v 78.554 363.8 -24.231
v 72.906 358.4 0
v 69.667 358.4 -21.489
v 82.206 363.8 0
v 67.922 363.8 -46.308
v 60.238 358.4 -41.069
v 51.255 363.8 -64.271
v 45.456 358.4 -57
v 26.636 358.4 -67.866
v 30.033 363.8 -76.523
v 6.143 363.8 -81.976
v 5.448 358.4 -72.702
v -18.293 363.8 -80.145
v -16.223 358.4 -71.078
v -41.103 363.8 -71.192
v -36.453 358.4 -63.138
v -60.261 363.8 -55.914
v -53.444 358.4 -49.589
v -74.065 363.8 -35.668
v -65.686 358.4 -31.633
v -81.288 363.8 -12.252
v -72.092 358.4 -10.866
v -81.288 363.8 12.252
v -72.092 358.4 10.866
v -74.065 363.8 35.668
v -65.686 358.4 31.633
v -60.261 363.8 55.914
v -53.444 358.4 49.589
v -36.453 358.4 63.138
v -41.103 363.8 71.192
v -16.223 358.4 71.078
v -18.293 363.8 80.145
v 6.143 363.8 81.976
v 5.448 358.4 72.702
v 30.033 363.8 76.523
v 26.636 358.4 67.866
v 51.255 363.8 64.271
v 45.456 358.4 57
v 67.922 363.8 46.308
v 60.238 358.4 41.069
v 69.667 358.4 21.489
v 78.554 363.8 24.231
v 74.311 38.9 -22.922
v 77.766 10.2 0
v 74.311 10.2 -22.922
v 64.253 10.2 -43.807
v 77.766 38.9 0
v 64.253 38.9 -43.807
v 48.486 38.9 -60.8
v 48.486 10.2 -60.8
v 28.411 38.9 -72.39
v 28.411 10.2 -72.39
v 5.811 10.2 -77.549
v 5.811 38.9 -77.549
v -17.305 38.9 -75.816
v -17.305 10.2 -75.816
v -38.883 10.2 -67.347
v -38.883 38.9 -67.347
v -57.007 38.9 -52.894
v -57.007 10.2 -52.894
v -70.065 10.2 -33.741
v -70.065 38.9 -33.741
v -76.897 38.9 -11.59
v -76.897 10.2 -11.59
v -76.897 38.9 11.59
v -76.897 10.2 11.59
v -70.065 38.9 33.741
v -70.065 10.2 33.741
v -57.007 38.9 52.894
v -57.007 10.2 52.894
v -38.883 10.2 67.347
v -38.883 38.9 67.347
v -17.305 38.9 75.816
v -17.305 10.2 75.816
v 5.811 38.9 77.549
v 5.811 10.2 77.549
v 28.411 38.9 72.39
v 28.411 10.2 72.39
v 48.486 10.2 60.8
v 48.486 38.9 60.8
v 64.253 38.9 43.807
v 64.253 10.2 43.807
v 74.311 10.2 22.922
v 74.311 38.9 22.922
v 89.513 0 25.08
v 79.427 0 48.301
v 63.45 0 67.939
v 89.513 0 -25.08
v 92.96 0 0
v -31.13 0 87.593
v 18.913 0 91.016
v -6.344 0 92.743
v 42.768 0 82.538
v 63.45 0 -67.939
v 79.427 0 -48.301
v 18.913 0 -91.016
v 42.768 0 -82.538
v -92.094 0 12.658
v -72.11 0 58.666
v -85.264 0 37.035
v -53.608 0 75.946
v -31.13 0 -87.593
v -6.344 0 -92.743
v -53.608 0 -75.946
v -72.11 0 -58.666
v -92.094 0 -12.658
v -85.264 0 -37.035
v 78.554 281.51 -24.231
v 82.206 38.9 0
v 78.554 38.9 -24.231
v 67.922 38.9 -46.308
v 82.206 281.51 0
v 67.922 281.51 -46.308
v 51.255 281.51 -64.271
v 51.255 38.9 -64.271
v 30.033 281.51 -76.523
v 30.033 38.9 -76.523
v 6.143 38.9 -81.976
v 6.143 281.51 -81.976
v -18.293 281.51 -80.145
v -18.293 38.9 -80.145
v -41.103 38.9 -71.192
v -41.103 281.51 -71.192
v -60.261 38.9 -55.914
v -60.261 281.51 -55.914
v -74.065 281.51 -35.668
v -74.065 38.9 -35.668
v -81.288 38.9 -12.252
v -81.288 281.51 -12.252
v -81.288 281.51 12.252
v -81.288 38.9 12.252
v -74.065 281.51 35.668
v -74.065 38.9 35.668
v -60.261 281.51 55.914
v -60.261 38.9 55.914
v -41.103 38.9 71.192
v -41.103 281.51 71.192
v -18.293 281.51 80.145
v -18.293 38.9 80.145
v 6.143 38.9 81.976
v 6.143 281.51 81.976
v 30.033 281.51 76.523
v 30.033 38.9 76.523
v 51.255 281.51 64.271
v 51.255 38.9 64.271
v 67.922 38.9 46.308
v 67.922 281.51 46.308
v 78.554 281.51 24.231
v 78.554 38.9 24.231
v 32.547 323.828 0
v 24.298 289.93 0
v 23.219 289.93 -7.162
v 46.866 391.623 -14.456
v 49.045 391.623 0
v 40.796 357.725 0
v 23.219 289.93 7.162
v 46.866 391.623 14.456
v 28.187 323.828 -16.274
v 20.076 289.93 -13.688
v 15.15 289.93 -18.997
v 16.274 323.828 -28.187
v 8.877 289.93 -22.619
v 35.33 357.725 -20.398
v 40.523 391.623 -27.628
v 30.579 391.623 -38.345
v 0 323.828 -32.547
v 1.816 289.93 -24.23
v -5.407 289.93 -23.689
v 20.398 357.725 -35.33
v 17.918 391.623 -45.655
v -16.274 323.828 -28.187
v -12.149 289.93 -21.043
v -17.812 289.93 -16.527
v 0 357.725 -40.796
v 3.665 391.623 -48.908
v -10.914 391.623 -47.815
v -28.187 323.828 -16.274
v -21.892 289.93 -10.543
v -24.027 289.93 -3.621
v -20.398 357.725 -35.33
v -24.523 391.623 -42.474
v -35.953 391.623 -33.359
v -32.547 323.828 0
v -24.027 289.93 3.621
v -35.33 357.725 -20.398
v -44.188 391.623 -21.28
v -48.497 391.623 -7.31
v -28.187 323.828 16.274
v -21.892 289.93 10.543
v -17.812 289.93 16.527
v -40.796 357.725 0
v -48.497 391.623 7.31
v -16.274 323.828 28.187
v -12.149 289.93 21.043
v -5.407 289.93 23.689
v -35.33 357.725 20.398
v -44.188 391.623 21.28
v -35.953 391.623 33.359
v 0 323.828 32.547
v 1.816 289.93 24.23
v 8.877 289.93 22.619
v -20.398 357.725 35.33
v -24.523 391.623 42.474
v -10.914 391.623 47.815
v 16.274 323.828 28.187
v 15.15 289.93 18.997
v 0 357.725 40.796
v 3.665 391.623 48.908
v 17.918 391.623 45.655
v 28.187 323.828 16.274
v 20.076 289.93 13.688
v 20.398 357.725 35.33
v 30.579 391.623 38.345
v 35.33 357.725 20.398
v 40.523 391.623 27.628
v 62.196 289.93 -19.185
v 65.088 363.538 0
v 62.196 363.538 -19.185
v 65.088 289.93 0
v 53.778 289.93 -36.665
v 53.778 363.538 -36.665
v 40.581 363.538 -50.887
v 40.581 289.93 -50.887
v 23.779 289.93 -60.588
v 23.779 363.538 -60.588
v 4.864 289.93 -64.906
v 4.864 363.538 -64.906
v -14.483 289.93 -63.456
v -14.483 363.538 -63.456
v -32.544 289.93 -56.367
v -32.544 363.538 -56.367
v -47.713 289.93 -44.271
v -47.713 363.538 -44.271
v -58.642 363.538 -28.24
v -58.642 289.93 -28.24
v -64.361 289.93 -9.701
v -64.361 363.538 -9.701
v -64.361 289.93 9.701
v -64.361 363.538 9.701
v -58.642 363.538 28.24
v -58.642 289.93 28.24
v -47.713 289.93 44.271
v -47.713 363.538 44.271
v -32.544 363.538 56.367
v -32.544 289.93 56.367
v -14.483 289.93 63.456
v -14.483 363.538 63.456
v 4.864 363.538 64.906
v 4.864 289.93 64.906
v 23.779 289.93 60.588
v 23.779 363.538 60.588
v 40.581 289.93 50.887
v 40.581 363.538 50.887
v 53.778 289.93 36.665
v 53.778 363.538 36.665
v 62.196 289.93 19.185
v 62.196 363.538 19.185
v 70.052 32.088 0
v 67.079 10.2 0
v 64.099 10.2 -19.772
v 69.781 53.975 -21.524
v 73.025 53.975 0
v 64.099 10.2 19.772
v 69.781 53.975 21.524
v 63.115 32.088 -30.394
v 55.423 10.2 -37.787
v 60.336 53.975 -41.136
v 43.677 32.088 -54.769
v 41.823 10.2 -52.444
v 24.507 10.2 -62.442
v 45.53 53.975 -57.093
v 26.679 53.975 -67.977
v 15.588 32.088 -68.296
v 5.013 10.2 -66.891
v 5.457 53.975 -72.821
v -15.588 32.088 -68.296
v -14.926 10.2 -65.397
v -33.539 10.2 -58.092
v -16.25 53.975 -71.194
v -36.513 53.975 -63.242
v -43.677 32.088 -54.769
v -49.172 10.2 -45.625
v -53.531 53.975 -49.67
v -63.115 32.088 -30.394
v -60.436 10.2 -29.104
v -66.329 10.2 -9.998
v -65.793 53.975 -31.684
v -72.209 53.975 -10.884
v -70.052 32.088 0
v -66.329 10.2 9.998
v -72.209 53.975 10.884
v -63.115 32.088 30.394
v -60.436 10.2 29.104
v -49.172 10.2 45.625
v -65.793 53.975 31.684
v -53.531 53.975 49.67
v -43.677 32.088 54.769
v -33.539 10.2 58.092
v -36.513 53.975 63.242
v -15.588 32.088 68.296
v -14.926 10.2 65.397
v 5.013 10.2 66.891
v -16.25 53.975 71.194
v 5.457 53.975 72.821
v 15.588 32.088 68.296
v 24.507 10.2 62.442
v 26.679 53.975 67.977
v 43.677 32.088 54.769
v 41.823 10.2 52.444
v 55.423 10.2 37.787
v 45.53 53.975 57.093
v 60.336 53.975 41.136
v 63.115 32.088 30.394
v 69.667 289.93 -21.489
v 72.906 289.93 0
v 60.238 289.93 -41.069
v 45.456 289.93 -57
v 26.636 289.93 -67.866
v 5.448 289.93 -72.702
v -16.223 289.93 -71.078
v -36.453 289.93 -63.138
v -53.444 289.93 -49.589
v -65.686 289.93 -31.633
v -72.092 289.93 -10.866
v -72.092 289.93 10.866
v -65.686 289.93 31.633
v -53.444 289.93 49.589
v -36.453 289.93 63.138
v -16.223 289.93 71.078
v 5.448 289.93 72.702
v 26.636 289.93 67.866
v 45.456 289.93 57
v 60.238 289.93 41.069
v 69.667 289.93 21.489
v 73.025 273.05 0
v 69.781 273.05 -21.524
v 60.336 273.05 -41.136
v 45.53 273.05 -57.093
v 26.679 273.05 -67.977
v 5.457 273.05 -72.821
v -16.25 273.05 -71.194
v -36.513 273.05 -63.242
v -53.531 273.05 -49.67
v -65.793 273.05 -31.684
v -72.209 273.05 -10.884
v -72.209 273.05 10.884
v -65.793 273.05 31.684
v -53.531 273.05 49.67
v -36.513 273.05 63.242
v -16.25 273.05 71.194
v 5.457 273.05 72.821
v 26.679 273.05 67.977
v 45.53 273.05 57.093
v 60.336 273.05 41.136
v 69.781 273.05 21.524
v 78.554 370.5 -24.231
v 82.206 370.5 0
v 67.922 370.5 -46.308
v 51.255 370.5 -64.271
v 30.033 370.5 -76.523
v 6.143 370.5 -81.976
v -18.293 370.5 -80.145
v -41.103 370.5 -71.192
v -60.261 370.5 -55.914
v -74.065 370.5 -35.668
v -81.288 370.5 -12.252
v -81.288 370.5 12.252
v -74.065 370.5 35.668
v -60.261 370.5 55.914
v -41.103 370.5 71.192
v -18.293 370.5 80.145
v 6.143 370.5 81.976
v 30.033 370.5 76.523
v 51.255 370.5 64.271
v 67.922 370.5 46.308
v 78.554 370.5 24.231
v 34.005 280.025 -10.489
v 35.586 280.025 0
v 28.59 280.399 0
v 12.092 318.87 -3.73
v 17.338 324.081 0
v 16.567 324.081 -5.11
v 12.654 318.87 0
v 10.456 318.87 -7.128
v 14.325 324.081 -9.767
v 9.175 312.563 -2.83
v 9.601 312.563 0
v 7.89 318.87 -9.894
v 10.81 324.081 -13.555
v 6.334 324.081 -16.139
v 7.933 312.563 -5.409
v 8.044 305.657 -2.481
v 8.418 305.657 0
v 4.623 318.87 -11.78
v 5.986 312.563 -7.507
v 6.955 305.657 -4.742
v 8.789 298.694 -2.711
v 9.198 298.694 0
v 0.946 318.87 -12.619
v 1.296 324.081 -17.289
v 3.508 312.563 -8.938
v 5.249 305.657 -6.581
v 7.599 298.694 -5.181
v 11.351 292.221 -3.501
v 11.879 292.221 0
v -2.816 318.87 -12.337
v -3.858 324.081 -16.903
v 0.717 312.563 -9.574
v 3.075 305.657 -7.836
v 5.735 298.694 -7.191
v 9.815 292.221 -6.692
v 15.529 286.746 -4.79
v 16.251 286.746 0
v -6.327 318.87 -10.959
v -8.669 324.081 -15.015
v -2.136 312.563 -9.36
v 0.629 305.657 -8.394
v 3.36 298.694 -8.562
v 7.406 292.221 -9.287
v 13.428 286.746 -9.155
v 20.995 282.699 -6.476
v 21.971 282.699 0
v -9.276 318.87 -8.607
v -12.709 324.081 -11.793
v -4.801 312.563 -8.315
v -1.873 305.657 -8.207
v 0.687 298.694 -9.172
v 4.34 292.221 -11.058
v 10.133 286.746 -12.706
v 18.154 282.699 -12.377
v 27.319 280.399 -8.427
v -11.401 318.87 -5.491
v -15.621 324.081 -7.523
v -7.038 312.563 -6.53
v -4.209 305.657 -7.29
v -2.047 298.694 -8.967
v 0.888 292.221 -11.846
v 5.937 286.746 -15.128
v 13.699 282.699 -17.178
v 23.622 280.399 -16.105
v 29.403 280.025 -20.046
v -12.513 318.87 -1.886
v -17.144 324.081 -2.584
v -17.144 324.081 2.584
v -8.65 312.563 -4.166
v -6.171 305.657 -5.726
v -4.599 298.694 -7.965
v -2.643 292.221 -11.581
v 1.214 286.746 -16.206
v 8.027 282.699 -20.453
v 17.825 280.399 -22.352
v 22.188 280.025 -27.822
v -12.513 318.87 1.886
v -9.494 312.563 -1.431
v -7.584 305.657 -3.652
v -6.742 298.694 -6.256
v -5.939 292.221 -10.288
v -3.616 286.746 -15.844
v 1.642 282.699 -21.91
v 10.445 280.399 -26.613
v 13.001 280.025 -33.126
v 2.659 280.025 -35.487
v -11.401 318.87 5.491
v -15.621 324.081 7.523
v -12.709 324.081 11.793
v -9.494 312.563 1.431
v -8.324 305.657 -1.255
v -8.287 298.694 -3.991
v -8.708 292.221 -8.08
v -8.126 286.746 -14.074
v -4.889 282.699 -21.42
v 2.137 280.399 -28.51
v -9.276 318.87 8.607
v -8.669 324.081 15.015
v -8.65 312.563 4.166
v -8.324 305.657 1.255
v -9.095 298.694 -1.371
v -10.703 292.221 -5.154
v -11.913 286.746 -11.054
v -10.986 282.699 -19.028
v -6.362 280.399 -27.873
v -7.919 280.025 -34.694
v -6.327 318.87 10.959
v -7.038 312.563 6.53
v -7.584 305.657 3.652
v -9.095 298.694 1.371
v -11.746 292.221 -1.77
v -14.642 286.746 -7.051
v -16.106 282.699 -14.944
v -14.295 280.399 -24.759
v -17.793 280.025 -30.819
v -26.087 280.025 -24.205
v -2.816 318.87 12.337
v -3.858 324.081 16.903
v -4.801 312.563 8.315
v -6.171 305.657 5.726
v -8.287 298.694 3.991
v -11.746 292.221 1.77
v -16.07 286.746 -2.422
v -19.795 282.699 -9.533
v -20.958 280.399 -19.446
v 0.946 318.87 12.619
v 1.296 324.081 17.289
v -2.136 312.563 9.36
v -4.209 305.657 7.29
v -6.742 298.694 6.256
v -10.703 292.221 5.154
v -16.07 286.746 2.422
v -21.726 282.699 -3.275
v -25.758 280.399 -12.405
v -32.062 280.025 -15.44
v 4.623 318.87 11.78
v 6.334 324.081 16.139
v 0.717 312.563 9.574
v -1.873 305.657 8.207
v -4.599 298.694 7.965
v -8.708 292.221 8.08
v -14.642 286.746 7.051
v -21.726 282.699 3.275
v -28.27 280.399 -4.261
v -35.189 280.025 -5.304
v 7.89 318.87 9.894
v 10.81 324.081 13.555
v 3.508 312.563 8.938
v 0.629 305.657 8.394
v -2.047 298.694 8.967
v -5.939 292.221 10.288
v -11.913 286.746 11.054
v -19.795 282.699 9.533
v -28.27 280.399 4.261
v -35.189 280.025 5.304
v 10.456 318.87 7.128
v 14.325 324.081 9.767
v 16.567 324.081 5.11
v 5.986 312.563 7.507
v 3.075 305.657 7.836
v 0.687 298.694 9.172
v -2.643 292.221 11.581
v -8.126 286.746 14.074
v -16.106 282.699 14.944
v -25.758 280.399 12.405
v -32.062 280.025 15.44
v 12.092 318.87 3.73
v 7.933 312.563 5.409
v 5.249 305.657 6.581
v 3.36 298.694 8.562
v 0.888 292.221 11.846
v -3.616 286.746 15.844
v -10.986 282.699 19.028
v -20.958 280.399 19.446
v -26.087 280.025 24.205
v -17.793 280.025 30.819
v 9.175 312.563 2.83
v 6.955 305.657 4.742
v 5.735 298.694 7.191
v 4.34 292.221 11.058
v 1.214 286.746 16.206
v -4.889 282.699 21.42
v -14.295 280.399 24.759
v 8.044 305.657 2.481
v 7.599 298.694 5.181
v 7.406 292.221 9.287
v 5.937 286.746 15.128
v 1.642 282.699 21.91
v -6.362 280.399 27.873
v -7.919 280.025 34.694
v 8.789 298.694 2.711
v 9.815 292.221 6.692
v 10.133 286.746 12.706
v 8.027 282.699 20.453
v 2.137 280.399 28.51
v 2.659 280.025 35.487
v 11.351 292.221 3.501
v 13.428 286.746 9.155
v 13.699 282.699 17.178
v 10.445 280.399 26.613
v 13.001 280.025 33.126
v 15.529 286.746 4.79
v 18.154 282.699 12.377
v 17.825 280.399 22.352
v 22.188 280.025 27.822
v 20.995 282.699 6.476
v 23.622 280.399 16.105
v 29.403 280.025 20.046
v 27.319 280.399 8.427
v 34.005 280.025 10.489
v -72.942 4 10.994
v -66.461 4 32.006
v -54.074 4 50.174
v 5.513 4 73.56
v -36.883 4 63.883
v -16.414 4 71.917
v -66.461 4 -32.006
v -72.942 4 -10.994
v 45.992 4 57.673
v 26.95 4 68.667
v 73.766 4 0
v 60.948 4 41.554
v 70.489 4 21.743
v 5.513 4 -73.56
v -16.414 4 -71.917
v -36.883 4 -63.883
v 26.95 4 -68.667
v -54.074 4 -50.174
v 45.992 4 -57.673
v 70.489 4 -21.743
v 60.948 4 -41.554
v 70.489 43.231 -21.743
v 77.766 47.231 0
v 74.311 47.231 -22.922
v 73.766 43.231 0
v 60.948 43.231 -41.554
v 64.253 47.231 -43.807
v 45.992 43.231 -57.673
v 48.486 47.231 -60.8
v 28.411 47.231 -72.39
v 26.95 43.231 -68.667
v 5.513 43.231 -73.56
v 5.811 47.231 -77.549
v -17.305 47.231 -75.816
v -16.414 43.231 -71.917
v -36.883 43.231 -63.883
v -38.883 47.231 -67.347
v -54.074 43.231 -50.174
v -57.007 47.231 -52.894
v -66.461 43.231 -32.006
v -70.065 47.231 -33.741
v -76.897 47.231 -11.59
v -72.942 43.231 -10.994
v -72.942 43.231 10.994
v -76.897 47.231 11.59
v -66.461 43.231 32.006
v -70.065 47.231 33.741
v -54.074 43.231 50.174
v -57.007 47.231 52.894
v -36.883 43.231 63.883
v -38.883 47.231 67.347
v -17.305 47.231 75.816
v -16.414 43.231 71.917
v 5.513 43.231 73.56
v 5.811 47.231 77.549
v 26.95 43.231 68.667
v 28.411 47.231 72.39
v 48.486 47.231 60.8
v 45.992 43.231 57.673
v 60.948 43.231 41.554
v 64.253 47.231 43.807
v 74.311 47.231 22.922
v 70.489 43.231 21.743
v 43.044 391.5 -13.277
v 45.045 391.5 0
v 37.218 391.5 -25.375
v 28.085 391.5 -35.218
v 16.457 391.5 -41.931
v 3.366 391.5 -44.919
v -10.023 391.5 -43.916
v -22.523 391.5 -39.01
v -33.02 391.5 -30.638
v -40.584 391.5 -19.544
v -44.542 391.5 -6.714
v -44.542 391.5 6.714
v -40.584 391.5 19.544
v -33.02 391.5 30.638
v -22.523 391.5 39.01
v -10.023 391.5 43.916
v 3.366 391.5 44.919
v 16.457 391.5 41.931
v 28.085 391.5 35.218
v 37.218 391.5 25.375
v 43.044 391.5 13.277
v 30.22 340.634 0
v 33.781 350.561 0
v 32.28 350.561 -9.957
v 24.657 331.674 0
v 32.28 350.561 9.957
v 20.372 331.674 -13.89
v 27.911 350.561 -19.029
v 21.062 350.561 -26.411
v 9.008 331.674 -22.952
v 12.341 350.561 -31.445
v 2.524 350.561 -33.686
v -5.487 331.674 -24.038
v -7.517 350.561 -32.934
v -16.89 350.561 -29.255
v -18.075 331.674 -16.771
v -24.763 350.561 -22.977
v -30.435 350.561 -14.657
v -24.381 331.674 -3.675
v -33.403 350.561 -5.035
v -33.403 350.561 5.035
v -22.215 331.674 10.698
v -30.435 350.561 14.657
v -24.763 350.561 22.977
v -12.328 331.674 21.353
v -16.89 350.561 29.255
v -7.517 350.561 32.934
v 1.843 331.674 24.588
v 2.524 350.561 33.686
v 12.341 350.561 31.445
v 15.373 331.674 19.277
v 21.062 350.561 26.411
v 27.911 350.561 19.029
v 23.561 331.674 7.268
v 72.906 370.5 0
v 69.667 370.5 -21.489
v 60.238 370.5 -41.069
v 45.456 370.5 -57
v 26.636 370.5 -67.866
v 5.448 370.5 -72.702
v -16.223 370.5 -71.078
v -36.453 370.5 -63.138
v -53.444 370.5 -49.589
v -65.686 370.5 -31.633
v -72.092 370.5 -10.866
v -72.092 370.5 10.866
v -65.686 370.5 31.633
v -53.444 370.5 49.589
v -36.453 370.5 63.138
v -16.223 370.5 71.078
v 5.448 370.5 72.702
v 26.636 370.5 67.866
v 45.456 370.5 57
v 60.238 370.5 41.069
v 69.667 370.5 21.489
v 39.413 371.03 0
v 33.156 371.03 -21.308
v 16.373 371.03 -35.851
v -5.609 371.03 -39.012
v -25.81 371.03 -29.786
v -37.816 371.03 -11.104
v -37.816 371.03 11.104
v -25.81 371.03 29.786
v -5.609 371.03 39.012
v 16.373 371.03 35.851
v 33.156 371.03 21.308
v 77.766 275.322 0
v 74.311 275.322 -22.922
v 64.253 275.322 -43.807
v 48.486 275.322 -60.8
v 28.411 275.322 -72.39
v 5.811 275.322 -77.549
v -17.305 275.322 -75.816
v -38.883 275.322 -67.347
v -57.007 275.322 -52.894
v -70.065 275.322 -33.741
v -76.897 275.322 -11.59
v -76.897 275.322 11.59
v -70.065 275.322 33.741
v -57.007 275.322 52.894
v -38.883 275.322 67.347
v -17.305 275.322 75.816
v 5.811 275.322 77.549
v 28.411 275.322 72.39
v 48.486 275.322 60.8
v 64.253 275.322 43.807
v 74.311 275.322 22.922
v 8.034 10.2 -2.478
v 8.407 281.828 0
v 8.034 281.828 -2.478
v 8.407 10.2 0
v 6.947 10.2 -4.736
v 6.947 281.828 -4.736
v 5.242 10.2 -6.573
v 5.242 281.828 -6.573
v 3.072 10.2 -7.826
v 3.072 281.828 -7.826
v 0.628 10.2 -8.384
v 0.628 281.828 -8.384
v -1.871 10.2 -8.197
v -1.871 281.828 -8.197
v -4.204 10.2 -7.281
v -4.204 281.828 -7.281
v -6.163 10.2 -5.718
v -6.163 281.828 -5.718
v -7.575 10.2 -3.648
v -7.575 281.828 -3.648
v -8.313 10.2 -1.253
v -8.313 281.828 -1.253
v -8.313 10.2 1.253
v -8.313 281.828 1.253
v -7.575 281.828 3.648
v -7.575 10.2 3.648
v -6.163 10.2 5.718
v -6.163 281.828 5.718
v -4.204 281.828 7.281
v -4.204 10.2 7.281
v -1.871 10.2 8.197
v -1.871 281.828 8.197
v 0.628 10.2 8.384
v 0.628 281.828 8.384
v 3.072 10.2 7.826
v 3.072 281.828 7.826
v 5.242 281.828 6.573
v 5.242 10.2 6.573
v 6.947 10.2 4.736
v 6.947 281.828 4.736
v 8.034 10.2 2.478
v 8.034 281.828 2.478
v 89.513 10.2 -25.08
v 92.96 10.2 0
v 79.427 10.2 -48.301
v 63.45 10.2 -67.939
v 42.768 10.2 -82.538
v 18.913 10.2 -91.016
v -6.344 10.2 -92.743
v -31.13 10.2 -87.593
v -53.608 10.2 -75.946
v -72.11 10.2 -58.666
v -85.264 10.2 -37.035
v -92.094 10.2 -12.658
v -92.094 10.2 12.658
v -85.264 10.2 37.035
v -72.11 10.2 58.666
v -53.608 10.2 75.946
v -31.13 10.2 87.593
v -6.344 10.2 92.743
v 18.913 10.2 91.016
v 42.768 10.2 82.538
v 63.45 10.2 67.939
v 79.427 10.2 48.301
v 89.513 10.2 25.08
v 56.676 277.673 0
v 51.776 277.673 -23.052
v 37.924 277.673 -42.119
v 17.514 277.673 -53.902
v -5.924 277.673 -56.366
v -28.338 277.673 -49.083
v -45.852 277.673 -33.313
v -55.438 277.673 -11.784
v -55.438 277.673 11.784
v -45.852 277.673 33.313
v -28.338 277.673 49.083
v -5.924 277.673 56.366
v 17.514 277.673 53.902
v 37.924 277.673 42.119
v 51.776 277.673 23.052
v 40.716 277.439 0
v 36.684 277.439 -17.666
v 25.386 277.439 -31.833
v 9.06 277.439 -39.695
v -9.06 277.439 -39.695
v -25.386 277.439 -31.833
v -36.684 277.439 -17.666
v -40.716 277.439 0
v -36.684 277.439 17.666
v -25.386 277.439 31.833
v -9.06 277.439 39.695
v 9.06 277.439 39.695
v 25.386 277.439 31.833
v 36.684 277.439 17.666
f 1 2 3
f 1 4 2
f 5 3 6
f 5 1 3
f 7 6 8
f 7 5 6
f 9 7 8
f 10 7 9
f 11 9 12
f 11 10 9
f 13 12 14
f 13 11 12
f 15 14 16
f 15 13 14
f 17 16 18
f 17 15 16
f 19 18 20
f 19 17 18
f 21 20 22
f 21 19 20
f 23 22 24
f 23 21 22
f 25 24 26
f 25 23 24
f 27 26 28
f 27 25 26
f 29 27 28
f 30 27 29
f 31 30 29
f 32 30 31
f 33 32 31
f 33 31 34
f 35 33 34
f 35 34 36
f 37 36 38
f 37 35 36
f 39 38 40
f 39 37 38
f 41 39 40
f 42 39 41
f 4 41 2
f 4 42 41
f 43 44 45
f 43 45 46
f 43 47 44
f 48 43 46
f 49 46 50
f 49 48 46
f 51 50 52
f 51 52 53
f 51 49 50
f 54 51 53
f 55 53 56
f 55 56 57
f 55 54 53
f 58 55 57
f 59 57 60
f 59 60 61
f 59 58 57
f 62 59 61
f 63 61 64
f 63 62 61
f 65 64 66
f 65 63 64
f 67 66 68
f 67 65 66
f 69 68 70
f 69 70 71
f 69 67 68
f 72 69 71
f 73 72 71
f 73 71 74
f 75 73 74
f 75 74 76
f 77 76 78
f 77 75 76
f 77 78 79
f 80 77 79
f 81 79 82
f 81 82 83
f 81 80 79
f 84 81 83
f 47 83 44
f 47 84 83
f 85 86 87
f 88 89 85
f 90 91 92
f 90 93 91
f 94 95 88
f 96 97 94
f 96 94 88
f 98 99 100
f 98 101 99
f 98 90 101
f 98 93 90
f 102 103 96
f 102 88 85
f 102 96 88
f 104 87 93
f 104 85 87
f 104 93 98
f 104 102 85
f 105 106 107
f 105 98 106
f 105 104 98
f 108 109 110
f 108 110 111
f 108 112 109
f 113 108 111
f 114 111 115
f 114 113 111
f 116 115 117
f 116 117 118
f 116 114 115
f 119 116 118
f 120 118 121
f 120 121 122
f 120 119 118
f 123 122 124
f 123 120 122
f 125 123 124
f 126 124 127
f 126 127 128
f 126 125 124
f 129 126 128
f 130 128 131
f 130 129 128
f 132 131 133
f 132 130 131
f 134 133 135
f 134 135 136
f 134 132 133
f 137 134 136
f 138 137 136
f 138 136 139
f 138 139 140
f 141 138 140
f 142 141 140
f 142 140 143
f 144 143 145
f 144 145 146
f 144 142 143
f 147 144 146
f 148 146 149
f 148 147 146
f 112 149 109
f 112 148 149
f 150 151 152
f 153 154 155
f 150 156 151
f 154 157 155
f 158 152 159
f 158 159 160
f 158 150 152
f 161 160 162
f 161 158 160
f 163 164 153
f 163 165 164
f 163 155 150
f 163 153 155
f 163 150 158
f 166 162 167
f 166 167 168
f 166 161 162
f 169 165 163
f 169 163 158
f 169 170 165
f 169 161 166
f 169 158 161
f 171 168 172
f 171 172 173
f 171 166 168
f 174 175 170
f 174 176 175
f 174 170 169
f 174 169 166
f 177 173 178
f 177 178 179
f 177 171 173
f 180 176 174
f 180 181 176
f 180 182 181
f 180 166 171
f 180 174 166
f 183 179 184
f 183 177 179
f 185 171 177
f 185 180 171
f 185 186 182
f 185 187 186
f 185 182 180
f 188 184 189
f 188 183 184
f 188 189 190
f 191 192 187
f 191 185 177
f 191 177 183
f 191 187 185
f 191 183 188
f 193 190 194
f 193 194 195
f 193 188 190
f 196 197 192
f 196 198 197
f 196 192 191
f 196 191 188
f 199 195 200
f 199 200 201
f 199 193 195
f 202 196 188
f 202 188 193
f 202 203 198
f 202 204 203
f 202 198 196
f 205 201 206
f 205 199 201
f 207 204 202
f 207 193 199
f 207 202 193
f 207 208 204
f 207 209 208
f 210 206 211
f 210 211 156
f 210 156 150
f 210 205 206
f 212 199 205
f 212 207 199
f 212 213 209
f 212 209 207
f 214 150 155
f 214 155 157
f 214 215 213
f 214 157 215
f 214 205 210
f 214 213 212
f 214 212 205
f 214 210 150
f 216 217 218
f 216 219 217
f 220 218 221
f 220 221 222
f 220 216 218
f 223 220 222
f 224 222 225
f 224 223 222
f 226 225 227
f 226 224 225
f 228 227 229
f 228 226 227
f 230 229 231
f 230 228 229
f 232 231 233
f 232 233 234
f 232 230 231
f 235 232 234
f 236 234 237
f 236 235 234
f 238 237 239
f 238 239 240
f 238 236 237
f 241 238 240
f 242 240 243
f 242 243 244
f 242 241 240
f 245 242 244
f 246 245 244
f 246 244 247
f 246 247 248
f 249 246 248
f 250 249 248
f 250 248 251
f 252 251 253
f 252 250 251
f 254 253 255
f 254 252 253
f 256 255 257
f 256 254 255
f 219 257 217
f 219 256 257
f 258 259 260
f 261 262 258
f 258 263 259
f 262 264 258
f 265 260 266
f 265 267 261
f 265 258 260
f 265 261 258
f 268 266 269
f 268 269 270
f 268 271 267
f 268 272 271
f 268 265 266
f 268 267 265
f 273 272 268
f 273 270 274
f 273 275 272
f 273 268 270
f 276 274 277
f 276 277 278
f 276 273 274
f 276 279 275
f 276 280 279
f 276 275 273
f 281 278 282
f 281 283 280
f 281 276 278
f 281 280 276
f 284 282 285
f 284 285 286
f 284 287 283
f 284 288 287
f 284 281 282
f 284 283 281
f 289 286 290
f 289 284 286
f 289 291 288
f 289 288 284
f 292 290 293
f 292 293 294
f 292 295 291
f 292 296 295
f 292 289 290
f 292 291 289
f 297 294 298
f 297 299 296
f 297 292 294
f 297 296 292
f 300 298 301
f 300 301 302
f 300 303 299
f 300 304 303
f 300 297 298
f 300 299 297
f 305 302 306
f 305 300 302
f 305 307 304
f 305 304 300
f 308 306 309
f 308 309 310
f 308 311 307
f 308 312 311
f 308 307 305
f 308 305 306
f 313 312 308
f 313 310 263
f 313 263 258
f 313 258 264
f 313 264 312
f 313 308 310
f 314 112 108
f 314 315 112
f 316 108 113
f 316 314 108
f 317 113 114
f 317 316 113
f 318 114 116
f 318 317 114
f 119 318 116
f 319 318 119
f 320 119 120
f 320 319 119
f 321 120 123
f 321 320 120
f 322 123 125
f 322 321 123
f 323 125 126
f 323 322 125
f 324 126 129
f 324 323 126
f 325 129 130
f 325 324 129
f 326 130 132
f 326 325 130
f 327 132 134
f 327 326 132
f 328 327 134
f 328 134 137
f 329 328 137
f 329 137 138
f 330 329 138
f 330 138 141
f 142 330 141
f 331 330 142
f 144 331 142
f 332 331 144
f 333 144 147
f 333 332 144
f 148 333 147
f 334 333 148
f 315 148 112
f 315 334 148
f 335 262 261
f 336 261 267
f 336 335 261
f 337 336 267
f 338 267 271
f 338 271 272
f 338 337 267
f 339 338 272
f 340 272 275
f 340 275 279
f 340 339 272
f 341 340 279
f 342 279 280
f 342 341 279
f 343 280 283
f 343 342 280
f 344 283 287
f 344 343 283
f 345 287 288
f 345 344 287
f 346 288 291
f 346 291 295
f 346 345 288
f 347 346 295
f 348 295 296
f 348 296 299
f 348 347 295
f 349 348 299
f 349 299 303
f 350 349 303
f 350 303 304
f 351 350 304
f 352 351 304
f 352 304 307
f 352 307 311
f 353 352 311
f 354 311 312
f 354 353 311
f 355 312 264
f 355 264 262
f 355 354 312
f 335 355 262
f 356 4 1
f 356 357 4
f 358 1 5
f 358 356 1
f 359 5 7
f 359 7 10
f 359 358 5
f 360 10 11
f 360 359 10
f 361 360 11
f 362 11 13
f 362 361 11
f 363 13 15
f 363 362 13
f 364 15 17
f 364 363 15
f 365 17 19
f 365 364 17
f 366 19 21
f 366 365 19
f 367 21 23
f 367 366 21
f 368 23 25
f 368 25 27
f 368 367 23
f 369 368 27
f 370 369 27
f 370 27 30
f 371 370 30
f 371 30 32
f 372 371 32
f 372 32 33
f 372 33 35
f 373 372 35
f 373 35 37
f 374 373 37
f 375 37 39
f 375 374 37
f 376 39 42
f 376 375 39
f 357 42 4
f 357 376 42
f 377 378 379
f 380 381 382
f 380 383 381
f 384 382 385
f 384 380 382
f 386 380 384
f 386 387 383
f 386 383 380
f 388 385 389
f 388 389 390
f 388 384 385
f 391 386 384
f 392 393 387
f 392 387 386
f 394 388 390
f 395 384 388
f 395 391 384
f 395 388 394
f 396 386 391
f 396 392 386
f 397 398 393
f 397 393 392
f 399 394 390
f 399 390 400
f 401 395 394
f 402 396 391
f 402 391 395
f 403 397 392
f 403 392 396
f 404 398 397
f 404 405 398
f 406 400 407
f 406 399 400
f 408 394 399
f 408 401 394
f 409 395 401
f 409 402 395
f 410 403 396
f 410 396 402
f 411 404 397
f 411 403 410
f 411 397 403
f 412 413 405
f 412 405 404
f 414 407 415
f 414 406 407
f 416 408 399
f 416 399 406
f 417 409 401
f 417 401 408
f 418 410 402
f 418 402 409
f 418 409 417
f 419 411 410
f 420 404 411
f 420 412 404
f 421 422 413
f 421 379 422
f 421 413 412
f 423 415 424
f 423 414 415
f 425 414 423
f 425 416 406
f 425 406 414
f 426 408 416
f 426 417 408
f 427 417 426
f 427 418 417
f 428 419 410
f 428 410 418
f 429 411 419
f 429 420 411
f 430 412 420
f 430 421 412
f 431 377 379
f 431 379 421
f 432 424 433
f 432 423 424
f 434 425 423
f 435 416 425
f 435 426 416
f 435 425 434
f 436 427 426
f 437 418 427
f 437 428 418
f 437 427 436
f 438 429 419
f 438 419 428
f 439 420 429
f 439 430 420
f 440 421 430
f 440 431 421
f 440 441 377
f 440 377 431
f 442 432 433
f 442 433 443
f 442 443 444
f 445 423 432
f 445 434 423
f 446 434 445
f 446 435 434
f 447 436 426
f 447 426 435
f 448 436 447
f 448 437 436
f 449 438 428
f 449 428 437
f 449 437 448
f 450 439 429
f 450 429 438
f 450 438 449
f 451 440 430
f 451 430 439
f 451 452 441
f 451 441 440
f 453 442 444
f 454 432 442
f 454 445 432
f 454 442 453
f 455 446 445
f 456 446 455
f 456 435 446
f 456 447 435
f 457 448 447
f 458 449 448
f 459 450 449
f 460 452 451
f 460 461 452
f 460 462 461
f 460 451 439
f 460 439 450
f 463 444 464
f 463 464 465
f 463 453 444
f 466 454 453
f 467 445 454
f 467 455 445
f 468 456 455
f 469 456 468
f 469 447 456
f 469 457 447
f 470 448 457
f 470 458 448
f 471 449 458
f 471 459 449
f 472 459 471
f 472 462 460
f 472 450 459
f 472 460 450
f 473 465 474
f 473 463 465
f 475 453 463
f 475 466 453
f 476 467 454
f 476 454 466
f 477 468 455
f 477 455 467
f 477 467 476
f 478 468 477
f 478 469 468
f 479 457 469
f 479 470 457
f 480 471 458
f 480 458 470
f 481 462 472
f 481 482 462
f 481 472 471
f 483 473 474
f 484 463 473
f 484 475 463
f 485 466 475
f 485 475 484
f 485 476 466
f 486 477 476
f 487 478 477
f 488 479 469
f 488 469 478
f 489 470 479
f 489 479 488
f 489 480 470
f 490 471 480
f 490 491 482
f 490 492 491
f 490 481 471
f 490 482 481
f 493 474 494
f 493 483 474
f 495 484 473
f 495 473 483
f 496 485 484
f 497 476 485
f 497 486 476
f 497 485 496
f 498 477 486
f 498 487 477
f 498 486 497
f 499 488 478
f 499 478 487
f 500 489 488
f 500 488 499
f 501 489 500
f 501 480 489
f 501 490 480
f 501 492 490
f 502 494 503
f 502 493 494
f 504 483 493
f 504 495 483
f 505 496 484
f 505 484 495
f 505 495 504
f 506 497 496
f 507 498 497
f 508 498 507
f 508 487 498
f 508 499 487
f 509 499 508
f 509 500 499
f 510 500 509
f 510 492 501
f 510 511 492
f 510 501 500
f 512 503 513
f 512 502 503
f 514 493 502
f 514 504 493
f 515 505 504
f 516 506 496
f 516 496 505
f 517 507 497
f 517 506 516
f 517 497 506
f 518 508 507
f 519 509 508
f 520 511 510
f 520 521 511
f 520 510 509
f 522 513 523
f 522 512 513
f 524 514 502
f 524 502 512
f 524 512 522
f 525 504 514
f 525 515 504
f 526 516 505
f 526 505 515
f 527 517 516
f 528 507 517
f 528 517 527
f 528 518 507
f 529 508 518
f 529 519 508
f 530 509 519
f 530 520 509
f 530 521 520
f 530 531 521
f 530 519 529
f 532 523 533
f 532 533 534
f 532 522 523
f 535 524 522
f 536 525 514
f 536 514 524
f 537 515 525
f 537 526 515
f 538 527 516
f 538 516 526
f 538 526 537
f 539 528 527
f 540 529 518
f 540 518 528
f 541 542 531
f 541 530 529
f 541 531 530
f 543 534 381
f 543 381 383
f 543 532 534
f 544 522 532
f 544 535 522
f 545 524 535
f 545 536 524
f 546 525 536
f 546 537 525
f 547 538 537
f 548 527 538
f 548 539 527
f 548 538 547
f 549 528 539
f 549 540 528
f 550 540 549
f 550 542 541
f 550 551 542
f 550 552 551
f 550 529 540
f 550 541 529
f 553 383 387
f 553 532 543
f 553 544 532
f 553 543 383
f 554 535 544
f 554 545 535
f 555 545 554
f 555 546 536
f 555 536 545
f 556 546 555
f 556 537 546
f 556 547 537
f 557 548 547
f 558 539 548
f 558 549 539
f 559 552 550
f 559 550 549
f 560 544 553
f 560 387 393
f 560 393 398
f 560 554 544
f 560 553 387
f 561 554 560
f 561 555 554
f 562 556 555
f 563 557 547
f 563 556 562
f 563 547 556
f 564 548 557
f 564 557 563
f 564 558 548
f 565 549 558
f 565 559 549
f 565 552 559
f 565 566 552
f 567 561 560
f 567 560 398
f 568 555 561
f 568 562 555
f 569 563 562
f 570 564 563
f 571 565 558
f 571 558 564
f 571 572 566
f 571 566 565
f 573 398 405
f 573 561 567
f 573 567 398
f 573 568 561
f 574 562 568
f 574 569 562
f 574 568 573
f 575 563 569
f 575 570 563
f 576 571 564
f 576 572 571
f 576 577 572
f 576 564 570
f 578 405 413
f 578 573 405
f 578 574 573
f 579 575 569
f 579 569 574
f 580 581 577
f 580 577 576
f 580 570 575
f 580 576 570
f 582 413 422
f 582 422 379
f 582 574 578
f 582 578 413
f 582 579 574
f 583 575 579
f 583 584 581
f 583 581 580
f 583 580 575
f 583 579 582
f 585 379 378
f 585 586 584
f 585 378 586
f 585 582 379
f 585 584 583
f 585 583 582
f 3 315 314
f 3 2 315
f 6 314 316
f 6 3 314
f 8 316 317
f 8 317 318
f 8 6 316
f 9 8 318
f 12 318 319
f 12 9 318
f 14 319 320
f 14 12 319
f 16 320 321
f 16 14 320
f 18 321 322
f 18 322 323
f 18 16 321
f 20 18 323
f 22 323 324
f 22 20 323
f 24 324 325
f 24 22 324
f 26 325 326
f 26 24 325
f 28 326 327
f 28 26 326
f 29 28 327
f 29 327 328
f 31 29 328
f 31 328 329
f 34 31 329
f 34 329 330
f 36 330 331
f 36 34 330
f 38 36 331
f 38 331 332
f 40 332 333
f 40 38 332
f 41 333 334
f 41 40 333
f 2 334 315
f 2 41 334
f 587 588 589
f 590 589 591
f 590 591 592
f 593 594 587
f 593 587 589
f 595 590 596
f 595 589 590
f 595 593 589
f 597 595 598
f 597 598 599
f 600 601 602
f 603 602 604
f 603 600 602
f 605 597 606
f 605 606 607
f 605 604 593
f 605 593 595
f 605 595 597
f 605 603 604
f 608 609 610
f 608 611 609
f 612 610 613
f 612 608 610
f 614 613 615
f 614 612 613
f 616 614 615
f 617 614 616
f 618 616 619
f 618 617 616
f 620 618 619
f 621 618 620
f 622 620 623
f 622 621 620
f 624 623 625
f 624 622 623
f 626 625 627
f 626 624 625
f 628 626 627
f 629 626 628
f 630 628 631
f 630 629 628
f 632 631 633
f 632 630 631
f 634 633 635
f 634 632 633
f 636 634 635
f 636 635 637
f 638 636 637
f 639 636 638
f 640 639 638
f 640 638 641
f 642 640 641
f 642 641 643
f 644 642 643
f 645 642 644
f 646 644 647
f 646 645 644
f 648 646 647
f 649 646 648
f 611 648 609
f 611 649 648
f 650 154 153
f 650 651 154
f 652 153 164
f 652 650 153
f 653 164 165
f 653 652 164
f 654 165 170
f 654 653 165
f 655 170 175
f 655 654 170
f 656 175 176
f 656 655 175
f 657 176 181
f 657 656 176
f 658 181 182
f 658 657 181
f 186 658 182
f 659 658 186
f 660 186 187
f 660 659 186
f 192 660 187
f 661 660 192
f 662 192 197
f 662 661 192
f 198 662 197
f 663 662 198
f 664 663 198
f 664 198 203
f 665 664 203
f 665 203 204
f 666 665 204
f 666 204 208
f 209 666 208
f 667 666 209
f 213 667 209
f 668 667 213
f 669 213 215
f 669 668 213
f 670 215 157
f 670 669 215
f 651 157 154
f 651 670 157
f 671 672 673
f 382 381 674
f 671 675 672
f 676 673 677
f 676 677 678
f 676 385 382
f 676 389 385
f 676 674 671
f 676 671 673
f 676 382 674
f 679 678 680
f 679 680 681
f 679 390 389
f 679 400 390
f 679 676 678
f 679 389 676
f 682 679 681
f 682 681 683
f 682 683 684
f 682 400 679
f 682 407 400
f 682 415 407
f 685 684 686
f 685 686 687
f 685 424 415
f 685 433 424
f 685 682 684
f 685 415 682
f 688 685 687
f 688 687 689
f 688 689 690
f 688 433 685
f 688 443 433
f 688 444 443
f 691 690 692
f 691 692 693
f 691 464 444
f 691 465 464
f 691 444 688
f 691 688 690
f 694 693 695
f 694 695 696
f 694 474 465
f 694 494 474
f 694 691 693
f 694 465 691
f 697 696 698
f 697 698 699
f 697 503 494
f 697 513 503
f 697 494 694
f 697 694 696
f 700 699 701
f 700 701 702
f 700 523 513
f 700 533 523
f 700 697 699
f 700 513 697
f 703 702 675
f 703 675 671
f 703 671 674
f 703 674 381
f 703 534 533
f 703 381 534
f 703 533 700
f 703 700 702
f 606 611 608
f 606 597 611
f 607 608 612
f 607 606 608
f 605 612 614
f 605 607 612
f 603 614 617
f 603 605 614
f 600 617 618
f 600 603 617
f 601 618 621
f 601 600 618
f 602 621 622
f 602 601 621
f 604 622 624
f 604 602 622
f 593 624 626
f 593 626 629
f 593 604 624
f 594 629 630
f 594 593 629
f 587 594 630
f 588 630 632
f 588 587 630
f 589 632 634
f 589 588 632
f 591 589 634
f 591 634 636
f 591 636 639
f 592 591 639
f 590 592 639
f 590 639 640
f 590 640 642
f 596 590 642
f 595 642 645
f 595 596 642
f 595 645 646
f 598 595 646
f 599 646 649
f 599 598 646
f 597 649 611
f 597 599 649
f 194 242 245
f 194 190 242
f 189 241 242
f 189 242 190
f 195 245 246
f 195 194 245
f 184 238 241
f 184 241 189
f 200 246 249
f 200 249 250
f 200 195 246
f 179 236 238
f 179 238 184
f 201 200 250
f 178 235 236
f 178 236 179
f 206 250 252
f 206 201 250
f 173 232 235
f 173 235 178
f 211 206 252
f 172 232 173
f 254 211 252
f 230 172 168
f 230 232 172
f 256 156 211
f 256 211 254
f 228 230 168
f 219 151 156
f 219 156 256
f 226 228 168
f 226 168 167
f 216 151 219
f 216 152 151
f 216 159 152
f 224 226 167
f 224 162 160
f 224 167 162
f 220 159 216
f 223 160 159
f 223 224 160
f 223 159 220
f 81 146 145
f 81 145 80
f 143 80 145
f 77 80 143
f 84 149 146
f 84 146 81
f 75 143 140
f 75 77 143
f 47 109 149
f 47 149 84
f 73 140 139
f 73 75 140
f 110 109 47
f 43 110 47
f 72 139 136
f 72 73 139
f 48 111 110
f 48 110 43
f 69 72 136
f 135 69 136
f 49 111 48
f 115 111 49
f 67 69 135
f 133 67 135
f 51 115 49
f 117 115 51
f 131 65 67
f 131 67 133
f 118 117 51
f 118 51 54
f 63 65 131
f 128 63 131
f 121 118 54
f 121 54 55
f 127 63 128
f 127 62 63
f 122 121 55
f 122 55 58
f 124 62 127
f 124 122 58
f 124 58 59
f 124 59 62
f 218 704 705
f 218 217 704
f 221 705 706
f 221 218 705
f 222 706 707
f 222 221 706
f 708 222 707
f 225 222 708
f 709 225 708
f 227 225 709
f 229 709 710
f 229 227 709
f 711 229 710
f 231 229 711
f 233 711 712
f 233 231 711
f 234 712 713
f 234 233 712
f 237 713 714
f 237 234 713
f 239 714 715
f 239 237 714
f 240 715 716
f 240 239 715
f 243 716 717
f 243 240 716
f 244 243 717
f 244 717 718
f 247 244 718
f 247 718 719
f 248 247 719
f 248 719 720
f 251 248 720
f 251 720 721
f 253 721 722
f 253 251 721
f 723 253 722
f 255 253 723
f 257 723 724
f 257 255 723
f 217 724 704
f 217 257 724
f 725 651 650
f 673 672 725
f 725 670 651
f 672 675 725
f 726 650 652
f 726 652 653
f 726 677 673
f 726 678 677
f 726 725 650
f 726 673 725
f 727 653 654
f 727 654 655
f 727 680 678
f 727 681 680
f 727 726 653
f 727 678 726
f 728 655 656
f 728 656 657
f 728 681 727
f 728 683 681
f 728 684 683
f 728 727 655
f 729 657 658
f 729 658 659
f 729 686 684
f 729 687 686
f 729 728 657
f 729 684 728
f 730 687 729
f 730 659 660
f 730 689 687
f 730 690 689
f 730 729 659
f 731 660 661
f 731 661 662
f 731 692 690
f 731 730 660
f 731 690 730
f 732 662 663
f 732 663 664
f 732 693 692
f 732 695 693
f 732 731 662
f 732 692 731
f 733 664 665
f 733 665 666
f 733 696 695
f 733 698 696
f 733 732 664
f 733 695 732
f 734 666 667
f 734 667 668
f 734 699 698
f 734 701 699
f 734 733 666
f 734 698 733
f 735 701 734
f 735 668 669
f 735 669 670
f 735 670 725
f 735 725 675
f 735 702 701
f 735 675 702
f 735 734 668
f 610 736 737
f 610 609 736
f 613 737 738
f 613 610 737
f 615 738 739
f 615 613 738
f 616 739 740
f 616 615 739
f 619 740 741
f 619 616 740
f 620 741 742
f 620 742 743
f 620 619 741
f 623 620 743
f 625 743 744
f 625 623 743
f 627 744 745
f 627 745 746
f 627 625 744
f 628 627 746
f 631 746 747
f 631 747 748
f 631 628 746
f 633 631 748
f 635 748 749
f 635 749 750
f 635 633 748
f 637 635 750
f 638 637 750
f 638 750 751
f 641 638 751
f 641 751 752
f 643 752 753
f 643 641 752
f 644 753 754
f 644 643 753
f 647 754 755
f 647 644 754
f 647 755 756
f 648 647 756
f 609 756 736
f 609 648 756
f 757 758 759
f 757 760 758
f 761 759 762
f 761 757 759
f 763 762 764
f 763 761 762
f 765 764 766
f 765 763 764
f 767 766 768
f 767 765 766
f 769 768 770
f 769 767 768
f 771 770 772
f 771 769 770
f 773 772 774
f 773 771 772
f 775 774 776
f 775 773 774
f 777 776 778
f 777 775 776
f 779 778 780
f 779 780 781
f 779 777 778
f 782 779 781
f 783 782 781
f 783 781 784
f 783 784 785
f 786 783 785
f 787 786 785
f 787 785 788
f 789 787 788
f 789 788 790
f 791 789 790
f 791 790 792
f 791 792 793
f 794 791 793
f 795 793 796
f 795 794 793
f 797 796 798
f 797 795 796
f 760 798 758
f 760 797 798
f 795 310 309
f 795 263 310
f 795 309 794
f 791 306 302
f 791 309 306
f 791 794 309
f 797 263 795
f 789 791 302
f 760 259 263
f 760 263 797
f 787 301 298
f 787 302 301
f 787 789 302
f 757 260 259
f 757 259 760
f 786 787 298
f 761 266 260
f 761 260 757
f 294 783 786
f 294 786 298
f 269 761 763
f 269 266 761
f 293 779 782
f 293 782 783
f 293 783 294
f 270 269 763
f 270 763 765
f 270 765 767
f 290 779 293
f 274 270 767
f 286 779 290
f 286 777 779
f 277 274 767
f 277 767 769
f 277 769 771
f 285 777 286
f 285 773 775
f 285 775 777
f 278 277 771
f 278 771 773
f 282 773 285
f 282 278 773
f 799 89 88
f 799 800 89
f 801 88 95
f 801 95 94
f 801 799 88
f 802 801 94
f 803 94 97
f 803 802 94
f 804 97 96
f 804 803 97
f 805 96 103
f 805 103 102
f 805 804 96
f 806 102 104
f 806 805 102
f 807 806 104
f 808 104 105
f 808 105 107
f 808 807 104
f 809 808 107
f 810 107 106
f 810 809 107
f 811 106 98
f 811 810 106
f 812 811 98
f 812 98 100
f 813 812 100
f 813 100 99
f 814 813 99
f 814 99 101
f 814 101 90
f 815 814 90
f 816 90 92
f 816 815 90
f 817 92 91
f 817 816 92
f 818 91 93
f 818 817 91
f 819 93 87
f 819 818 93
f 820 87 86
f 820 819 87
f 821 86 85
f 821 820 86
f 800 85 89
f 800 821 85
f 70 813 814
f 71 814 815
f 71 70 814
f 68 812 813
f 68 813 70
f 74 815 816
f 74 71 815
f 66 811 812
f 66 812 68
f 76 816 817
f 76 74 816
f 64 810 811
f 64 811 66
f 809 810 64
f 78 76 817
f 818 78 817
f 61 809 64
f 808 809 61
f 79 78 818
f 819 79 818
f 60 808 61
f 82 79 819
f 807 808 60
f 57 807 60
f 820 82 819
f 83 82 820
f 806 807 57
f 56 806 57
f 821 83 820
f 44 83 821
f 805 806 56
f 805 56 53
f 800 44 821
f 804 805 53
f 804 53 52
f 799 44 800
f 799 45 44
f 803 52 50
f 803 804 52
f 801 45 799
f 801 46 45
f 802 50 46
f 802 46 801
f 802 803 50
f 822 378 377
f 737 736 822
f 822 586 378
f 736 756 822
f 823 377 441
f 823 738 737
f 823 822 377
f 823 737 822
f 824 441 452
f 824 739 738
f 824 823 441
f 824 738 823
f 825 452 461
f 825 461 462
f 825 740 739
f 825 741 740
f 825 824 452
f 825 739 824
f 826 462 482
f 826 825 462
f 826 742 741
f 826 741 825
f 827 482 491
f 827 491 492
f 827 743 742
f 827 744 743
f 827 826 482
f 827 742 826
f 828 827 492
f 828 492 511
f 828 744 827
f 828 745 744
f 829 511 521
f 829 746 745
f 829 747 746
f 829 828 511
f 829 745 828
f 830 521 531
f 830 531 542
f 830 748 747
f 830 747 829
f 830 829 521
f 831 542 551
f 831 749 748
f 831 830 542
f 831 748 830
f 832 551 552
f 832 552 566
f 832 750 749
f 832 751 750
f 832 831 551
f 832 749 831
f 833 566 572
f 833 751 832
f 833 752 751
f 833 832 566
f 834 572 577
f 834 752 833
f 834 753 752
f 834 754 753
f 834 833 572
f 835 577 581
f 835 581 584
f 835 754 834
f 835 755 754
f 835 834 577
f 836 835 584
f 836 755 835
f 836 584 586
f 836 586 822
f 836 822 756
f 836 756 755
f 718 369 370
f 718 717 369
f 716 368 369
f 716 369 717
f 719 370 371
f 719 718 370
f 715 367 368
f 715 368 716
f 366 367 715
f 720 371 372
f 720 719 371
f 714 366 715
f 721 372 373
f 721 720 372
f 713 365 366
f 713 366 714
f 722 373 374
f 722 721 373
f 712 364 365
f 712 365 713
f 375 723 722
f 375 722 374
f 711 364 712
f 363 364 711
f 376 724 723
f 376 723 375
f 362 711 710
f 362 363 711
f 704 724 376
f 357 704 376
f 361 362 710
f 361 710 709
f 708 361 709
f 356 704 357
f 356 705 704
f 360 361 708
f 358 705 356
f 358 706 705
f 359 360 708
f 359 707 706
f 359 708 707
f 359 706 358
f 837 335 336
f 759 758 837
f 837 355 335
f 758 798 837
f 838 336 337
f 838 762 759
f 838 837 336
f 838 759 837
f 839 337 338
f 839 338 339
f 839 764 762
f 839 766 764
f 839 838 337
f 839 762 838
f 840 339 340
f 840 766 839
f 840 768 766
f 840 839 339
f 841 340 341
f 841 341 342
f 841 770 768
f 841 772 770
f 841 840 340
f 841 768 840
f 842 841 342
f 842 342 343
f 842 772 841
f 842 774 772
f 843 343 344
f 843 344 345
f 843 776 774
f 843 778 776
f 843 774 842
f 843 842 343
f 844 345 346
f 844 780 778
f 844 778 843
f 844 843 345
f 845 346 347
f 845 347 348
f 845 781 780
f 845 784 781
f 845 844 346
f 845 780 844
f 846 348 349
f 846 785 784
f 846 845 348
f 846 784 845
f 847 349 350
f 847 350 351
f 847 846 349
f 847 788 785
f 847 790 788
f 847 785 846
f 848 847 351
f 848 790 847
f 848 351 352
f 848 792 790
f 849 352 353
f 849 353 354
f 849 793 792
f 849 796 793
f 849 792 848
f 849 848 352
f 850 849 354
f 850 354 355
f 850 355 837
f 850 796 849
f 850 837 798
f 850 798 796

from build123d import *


with BuildPart() as part:
    # Sketch1 → Revolve1 (revolve)
    with BuildSketch(Plane.XY):
        with BuildLine():
            Line((0, 0), (92.96, 0))
            Line((92.96, 0), (92.96, 10.2))
            Line((92.96, 10.2), (77.766, 10.2))
            Line((77.766, 10.2), (77.766, 38.9))
            Line((77.766, 38.9), (82.206, 38.9))
            Line((82.206, 38.9), (82.206, 281.51))
            Line((82.206, 281.51), (72.906, 289.93))
            Line((72.906, 289.93), (72.906, 358.4))
            Line((72.906, 358.4), (82.206, 363.8))
            Line((82.206, 363.8), (82.206, 370.5))
            Line((82.206, 370.5), (72.906, 370.5))
            Line((72.906, 370.5), (65.0875, 363.5375))
            Line((65.0875, 363.5375), (65.0875, 289.93))
            Line((65.0875, 289.93), (24.298190419, 289.93))
            Line((24.298190419, 289.93), (49.045, 391.622879584))
            Line((49.045, 391.622879584), (45.045, 391.5))
            Line((45.045, 391.5), (33.78053484, 350.560926443))
            ThreePointArc((33.78053484, 350.560926443), (27.675249702, 336.006994767), (17.337709758, 324.081111078))
            ThreePointArc((17.337709758, 324.081111078), (10.310411687, 295.362914191), (35.586293569, 280.025132548))
            Line((35.586293569, 280.025132548), (77.766, 275.321756158))
            Line((77.766, 275.321756158), (77.766, 47.2311364))
            Line((77.766, 47.2311364), (73.766, 43.2311364))
            Line((73.766, 43.2311364), (73.766, 4))
            Line((73.766, 4), (0, 4))
            Line((0, 4), (0, 0))
        make_face()
        Polygon((8.4074, 10.2), (67.07869918, 10.2), (73.025, 53.975), (73.025, 273.05), (8.4074, 281.827514286), align=None)
    revolve(axis=Axis((0, 0, 0), (0, 1, 0)))


solid = part.part
